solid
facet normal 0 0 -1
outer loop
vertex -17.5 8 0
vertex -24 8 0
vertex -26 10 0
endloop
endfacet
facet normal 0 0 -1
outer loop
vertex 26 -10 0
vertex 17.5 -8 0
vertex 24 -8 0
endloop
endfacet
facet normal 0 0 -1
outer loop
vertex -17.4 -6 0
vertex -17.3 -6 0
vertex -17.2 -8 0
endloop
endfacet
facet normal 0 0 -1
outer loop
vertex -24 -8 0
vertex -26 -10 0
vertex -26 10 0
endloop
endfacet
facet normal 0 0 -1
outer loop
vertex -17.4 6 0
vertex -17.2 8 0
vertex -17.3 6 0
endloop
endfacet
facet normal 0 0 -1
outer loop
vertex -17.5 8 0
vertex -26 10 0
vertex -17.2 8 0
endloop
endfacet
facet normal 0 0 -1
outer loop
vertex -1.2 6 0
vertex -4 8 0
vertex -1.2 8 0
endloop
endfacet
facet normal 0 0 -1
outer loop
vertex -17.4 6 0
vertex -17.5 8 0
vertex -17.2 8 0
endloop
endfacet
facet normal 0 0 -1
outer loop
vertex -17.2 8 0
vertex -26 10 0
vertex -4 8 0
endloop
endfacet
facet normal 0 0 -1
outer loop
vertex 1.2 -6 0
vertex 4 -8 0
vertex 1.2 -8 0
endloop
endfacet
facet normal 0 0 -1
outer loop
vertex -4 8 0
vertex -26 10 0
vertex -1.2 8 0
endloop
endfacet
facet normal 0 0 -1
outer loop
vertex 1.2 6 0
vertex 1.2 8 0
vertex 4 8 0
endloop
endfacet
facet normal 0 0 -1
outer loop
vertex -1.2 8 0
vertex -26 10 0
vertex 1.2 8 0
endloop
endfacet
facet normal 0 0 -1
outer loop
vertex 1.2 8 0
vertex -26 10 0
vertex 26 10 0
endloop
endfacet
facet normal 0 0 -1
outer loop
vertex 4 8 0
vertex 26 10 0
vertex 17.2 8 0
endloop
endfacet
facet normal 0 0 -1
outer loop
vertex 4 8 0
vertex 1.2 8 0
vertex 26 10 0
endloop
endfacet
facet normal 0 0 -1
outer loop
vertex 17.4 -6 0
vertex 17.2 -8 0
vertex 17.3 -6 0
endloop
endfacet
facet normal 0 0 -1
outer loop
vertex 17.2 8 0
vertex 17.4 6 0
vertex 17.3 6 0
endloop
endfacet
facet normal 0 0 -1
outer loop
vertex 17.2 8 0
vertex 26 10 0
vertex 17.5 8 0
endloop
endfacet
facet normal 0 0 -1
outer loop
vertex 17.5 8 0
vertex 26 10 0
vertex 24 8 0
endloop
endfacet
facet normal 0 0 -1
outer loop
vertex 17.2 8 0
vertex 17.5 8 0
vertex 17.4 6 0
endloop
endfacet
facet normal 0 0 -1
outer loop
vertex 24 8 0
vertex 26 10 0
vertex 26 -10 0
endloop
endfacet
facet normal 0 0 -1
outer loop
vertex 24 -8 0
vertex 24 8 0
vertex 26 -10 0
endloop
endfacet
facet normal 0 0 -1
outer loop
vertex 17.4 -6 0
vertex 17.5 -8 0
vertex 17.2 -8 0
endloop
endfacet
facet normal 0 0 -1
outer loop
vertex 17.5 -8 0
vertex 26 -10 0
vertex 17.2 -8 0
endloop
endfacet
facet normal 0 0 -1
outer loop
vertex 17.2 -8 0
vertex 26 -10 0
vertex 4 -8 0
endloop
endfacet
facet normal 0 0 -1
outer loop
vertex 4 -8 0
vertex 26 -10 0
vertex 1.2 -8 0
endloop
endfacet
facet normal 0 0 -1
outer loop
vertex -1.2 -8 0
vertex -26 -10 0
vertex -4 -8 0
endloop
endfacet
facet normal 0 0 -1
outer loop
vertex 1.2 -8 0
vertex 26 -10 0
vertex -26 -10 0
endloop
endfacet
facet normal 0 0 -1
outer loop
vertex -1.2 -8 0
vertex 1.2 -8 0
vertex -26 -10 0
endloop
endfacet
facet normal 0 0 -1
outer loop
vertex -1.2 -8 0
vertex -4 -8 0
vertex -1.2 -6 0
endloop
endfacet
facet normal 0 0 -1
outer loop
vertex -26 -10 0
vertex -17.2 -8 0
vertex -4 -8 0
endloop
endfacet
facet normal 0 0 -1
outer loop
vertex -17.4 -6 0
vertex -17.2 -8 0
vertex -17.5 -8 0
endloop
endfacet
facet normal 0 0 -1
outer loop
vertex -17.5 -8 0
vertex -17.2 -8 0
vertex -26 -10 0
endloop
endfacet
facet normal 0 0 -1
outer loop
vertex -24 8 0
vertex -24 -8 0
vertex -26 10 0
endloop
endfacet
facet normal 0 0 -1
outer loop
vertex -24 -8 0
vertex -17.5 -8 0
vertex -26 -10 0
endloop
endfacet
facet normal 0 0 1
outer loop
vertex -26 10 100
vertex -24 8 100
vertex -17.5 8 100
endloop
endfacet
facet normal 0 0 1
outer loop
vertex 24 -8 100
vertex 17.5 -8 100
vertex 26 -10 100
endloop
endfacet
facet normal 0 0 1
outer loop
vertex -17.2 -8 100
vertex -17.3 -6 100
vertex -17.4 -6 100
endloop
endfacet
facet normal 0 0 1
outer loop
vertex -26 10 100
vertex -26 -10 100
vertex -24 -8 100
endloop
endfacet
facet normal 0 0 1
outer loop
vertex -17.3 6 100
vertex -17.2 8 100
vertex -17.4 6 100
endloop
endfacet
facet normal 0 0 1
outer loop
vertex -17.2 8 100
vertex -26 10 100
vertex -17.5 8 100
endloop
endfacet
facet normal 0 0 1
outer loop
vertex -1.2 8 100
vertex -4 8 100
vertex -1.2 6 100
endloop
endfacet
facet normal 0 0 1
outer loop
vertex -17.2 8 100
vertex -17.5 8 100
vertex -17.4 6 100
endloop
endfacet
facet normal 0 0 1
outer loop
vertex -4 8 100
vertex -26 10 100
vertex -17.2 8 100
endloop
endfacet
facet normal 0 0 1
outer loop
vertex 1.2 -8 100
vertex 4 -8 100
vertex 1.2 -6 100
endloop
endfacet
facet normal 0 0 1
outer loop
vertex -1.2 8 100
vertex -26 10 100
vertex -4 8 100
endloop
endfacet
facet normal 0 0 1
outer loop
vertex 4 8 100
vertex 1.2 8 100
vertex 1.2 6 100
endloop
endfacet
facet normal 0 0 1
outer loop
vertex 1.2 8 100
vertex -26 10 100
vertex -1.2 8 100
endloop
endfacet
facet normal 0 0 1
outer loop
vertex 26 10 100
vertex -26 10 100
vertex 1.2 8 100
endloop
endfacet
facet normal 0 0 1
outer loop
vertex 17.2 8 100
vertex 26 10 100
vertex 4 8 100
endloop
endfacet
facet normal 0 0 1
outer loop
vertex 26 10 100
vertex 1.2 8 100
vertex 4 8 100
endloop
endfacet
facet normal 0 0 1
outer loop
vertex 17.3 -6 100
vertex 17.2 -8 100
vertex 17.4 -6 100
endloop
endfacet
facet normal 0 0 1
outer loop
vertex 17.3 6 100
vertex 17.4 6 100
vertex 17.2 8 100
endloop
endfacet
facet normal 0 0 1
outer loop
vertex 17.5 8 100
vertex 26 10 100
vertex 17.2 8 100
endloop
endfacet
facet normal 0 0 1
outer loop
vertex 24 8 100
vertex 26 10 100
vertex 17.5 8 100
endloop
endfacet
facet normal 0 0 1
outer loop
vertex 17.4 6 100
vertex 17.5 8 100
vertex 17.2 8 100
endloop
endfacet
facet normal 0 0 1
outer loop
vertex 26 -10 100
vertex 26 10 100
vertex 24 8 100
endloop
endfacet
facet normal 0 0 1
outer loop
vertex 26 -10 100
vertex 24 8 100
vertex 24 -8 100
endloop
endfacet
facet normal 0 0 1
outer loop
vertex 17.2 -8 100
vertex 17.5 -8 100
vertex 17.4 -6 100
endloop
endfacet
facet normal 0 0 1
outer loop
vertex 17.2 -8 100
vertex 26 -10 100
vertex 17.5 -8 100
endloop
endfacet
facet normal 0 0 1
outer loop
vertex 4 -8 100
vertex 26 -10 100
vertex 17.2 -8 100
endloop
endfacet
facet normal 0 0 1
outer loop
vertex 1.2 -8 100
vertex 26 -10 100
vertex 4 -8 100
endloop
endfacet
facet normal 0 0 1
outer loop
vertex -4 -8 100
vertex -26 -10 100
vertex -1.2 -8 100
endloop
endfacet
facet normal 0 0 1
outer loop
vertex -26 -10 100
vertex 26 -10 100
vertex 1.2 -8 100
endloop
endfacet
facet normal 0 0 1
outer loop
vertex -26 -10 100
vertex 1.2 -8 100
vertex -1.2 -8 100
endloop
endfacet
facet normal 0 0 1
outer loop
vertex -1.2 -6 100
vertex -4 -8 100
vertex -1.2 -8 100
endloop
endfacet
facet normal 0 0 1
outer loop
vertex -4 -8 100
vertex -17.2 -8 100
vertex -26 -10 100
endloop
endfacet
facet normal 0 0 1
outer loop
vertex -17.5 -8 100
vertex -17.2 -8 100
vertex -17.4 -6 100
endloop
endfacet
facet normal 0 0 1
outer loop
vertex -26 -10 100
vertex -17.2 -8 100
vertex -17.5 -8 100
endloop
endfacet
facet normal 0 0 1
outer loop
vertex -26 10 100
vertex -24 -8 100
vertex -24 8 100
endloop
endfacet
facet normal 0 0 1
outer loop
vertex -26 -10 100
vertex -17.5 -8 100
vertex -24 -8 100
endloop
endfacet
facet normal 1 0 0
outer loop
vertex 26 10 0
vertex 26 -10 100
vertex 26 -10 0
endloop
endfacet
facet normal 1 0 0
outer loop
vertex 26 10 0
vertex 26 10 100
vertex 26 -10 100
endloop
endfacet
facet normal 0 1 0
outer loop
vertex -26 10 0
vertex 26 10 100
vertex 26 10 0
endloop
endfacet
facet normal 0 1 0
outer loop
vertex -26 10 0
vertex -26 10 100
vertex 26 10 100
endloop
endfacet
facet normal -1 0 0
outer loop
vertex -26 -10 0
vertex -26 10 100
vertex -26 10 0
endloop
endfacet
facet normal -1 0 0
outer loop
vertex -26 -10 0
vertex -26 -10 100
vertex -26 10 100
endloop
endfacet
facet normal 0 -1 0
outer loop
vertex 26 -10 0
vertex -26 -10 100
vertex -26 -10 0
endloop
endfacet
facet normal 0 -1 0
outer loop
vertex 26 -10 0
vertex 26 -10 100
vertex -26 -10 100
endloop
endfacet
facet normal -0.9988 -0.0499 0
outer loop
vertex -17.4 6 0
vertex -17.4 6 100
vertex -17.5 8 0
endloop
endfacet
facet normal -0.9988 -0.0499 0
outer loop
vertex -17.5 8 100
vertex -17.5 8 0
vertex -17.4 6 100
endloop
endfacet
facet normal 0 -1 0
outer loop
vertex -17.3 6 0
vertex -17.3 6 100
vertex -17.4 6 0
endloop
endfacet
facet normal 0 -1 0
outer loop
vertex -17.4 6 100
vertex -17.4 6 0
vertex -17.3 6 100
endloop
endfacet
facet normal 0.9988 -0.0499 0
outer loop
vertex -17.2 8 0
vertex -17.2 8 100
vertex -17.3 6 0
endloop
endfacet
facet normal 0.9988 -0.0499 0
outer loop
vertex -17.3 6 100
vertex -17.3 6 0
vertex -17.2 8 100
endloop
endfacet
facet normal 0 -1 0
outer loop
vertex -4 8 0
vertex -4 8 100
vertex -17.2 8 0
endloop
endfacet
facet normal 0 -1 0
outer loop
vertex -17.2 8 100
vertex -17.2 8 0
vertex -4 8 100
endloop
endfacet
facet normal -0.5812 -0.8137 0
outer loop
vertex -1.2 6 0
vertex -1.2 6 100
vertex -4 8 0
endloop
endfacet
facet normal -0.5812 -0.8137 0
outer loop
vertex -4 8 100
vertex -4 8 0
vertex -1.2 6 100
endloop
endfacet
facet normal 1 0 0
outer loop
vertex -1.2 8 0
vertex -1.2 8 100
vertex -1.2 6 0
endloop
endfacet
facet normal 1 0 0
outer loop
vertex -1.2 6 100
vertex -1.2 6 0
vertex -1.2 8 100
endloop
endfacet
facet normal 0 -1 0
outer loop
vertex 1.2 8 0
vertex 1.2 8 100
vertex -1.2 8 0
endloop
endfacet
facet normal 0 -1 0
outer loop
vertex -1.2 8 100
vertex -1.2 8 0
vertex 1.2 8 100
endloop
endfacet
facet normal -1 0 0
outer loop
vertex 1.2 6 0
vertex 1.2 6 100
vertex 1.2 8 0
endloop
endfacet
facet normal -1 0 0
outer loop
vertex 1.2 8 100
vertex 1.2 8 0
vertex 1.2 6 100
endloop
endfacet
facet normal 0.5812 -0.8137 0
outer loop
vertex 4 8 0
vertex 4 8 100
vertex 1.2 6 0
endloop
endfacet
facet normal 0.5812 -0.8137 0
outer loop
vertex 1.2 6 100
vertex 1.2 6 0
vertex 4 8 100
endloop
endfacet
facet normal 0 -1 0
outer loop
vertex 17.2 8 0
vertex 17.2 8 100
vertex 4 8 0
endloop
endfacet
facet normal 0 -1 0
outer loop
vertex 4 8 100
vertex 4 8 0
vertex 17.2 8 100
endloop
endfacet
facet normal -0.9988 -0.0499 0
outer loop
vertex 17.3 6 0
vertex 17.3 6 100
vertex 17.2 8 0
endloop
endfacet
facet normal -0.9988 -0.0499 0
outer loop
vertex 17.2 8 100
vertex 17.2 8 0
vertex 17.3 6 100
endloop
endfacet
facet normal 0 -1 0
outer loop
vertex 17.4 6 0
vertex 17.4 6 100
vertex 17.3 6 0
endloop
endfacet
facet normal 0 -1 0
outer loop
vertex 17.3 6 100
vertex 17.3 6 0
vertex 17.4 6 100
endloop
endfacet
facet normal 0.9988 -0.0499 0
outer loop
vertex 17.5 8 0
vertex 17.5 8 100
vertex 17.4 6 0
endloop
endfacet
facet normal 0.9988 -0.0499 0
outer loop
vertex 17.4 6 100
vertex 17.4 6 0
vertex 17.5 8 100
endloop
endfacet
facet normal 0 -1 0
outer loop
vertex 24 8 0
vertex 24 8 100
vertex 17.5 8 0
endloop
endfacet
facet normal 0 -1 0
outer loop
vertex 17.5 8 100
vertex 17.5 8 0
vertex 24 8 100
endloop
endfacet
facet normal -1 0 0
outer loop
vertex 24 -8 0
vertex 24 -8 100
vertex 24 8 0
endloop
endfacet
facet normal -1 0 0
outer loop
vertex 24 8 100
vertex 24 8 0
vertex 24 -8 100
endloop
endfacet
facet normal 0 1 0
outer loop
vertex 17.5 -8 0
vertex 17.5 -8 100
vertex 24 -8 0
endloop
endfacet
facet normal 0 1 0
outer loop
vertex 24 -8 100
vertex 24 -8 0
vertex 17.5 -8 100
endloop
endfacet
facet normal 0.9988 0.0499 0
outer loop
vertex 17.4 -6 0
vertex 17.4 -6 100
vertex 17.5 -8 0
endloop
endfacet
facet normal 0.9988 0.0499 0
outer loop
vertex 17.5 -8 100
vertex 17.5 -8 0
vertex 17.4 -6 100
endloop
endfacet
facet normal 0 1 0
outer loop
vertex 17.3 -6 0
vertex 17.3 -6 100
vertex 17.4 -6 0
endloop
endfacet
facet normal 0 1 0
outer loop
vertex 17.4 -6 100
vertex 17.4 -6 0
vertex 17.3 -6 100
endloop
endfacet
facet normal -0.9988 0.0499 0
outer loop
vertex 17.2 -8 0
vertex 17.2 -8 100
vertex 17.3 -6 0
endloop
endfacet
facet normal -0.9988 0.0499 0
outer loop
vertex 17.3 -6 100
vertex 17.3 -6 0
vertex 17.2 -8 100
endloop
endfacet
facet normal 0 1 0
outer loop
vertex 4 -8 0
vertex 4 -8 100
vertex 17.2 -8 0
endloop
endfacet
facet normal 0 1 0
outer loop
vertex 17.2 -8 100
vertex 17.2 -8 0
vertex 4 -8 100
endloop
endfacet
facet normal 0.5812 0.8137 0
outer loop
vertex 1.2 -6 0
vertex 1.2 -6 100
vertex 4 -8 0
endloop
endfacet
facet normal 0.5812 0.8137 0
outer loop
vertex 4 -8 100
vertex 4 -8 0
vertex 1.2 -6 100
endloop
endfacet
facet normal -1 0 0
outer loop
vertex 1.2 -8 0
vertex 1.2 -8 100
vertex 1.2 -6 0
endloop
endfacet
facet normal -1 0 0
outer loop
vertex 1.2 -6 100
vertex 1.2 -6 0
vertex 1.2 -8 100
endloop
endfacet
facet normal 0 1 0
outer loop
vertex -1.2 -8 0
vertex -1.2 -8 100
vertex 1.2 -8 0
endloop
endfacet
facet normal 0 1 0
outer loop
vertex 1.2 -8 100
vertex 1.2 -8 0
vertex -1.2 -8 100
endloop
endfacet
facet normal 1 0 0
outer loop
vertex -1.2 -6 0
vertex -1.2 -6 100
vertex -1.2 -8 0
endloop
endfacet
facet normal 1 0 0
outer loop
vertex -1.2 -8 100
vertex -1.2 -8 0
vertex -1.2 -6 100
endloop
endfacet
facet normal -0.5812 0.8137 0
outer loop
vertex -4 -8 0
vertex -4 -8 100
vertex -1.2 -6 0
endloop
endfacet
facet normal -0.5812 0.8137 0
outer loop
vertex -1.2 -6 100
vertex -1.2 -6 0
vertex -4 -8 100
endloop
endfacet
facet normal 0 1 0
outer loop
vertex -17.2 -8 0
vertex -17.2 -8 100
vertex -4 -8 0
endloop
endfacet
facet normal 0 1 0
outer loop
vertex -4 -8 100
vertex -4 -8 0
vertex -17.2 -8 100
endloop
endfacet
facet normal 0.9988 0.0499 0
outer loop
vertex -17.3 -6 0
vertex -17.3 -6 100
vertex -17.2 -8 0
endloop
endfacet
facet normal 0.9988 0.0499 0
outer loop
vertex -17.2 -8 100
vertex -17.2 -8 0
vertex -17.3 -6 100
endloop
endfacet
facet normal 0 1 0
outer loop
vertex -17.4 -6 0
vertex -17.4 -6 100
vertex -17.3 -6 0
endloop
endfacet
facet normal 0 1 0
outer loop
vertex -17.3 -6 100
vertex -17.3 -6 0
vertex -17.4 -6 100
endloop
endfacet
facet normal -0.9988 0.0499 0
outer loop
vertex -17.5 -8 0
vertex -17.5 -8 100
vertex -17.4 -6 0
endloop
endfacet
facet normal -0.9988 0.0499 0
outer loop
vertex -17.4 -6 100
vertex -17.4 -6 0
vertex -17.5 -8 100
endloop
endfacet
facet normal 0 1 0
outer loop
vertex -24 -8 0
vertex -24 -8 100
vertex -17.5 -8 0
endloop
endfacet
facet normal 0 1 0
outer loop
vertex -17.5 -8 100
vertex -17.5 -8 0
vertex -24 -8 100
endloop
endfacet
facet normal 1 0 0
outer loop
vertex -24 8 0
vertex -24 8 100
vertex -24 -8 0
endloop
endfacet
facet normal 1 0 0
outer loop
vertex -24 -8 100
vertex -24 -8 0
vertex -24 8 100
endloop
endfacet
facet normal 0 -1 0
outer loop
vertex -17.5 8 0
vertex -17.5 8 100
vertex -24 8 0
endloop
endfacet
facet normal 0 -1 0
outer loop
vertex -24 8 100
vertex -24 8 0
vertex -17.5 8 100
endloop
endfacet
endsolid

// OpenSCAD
// target
t0=[[0,0],[0,2],[26,2],[26,0]];
p0=[0,1,2,3];
t1=[[26,2],[24,2],[24,10],[26,10]];
p1=[4,5,6,7];
t2=[[1.2,2],[1.2, 4],[4,2]];
p2=[8,9,10];
t3=[[17.2,2],[17.3,4],[17.4,4],[17.5,2]];
p3=[11,12,13,14];
ps=[p0,p1,p2,p3];

linear_extrude(height=100) {
    mirror([0,1,0])
        translate([0,-10,0]) {
            mirror([1,0,0])
                polygon(concat(t0,t1,t2,t3), ps);
            polygon(concat(t0,t1,t2,t3), ps);
        }
    translate([0,-10,0]) {
        mirror([1,0,0])
            polygon(concat(t0,t1,t2,t3), ps);
        polygon(concat(t0,t1,t2,t3), ps);
    }
}
